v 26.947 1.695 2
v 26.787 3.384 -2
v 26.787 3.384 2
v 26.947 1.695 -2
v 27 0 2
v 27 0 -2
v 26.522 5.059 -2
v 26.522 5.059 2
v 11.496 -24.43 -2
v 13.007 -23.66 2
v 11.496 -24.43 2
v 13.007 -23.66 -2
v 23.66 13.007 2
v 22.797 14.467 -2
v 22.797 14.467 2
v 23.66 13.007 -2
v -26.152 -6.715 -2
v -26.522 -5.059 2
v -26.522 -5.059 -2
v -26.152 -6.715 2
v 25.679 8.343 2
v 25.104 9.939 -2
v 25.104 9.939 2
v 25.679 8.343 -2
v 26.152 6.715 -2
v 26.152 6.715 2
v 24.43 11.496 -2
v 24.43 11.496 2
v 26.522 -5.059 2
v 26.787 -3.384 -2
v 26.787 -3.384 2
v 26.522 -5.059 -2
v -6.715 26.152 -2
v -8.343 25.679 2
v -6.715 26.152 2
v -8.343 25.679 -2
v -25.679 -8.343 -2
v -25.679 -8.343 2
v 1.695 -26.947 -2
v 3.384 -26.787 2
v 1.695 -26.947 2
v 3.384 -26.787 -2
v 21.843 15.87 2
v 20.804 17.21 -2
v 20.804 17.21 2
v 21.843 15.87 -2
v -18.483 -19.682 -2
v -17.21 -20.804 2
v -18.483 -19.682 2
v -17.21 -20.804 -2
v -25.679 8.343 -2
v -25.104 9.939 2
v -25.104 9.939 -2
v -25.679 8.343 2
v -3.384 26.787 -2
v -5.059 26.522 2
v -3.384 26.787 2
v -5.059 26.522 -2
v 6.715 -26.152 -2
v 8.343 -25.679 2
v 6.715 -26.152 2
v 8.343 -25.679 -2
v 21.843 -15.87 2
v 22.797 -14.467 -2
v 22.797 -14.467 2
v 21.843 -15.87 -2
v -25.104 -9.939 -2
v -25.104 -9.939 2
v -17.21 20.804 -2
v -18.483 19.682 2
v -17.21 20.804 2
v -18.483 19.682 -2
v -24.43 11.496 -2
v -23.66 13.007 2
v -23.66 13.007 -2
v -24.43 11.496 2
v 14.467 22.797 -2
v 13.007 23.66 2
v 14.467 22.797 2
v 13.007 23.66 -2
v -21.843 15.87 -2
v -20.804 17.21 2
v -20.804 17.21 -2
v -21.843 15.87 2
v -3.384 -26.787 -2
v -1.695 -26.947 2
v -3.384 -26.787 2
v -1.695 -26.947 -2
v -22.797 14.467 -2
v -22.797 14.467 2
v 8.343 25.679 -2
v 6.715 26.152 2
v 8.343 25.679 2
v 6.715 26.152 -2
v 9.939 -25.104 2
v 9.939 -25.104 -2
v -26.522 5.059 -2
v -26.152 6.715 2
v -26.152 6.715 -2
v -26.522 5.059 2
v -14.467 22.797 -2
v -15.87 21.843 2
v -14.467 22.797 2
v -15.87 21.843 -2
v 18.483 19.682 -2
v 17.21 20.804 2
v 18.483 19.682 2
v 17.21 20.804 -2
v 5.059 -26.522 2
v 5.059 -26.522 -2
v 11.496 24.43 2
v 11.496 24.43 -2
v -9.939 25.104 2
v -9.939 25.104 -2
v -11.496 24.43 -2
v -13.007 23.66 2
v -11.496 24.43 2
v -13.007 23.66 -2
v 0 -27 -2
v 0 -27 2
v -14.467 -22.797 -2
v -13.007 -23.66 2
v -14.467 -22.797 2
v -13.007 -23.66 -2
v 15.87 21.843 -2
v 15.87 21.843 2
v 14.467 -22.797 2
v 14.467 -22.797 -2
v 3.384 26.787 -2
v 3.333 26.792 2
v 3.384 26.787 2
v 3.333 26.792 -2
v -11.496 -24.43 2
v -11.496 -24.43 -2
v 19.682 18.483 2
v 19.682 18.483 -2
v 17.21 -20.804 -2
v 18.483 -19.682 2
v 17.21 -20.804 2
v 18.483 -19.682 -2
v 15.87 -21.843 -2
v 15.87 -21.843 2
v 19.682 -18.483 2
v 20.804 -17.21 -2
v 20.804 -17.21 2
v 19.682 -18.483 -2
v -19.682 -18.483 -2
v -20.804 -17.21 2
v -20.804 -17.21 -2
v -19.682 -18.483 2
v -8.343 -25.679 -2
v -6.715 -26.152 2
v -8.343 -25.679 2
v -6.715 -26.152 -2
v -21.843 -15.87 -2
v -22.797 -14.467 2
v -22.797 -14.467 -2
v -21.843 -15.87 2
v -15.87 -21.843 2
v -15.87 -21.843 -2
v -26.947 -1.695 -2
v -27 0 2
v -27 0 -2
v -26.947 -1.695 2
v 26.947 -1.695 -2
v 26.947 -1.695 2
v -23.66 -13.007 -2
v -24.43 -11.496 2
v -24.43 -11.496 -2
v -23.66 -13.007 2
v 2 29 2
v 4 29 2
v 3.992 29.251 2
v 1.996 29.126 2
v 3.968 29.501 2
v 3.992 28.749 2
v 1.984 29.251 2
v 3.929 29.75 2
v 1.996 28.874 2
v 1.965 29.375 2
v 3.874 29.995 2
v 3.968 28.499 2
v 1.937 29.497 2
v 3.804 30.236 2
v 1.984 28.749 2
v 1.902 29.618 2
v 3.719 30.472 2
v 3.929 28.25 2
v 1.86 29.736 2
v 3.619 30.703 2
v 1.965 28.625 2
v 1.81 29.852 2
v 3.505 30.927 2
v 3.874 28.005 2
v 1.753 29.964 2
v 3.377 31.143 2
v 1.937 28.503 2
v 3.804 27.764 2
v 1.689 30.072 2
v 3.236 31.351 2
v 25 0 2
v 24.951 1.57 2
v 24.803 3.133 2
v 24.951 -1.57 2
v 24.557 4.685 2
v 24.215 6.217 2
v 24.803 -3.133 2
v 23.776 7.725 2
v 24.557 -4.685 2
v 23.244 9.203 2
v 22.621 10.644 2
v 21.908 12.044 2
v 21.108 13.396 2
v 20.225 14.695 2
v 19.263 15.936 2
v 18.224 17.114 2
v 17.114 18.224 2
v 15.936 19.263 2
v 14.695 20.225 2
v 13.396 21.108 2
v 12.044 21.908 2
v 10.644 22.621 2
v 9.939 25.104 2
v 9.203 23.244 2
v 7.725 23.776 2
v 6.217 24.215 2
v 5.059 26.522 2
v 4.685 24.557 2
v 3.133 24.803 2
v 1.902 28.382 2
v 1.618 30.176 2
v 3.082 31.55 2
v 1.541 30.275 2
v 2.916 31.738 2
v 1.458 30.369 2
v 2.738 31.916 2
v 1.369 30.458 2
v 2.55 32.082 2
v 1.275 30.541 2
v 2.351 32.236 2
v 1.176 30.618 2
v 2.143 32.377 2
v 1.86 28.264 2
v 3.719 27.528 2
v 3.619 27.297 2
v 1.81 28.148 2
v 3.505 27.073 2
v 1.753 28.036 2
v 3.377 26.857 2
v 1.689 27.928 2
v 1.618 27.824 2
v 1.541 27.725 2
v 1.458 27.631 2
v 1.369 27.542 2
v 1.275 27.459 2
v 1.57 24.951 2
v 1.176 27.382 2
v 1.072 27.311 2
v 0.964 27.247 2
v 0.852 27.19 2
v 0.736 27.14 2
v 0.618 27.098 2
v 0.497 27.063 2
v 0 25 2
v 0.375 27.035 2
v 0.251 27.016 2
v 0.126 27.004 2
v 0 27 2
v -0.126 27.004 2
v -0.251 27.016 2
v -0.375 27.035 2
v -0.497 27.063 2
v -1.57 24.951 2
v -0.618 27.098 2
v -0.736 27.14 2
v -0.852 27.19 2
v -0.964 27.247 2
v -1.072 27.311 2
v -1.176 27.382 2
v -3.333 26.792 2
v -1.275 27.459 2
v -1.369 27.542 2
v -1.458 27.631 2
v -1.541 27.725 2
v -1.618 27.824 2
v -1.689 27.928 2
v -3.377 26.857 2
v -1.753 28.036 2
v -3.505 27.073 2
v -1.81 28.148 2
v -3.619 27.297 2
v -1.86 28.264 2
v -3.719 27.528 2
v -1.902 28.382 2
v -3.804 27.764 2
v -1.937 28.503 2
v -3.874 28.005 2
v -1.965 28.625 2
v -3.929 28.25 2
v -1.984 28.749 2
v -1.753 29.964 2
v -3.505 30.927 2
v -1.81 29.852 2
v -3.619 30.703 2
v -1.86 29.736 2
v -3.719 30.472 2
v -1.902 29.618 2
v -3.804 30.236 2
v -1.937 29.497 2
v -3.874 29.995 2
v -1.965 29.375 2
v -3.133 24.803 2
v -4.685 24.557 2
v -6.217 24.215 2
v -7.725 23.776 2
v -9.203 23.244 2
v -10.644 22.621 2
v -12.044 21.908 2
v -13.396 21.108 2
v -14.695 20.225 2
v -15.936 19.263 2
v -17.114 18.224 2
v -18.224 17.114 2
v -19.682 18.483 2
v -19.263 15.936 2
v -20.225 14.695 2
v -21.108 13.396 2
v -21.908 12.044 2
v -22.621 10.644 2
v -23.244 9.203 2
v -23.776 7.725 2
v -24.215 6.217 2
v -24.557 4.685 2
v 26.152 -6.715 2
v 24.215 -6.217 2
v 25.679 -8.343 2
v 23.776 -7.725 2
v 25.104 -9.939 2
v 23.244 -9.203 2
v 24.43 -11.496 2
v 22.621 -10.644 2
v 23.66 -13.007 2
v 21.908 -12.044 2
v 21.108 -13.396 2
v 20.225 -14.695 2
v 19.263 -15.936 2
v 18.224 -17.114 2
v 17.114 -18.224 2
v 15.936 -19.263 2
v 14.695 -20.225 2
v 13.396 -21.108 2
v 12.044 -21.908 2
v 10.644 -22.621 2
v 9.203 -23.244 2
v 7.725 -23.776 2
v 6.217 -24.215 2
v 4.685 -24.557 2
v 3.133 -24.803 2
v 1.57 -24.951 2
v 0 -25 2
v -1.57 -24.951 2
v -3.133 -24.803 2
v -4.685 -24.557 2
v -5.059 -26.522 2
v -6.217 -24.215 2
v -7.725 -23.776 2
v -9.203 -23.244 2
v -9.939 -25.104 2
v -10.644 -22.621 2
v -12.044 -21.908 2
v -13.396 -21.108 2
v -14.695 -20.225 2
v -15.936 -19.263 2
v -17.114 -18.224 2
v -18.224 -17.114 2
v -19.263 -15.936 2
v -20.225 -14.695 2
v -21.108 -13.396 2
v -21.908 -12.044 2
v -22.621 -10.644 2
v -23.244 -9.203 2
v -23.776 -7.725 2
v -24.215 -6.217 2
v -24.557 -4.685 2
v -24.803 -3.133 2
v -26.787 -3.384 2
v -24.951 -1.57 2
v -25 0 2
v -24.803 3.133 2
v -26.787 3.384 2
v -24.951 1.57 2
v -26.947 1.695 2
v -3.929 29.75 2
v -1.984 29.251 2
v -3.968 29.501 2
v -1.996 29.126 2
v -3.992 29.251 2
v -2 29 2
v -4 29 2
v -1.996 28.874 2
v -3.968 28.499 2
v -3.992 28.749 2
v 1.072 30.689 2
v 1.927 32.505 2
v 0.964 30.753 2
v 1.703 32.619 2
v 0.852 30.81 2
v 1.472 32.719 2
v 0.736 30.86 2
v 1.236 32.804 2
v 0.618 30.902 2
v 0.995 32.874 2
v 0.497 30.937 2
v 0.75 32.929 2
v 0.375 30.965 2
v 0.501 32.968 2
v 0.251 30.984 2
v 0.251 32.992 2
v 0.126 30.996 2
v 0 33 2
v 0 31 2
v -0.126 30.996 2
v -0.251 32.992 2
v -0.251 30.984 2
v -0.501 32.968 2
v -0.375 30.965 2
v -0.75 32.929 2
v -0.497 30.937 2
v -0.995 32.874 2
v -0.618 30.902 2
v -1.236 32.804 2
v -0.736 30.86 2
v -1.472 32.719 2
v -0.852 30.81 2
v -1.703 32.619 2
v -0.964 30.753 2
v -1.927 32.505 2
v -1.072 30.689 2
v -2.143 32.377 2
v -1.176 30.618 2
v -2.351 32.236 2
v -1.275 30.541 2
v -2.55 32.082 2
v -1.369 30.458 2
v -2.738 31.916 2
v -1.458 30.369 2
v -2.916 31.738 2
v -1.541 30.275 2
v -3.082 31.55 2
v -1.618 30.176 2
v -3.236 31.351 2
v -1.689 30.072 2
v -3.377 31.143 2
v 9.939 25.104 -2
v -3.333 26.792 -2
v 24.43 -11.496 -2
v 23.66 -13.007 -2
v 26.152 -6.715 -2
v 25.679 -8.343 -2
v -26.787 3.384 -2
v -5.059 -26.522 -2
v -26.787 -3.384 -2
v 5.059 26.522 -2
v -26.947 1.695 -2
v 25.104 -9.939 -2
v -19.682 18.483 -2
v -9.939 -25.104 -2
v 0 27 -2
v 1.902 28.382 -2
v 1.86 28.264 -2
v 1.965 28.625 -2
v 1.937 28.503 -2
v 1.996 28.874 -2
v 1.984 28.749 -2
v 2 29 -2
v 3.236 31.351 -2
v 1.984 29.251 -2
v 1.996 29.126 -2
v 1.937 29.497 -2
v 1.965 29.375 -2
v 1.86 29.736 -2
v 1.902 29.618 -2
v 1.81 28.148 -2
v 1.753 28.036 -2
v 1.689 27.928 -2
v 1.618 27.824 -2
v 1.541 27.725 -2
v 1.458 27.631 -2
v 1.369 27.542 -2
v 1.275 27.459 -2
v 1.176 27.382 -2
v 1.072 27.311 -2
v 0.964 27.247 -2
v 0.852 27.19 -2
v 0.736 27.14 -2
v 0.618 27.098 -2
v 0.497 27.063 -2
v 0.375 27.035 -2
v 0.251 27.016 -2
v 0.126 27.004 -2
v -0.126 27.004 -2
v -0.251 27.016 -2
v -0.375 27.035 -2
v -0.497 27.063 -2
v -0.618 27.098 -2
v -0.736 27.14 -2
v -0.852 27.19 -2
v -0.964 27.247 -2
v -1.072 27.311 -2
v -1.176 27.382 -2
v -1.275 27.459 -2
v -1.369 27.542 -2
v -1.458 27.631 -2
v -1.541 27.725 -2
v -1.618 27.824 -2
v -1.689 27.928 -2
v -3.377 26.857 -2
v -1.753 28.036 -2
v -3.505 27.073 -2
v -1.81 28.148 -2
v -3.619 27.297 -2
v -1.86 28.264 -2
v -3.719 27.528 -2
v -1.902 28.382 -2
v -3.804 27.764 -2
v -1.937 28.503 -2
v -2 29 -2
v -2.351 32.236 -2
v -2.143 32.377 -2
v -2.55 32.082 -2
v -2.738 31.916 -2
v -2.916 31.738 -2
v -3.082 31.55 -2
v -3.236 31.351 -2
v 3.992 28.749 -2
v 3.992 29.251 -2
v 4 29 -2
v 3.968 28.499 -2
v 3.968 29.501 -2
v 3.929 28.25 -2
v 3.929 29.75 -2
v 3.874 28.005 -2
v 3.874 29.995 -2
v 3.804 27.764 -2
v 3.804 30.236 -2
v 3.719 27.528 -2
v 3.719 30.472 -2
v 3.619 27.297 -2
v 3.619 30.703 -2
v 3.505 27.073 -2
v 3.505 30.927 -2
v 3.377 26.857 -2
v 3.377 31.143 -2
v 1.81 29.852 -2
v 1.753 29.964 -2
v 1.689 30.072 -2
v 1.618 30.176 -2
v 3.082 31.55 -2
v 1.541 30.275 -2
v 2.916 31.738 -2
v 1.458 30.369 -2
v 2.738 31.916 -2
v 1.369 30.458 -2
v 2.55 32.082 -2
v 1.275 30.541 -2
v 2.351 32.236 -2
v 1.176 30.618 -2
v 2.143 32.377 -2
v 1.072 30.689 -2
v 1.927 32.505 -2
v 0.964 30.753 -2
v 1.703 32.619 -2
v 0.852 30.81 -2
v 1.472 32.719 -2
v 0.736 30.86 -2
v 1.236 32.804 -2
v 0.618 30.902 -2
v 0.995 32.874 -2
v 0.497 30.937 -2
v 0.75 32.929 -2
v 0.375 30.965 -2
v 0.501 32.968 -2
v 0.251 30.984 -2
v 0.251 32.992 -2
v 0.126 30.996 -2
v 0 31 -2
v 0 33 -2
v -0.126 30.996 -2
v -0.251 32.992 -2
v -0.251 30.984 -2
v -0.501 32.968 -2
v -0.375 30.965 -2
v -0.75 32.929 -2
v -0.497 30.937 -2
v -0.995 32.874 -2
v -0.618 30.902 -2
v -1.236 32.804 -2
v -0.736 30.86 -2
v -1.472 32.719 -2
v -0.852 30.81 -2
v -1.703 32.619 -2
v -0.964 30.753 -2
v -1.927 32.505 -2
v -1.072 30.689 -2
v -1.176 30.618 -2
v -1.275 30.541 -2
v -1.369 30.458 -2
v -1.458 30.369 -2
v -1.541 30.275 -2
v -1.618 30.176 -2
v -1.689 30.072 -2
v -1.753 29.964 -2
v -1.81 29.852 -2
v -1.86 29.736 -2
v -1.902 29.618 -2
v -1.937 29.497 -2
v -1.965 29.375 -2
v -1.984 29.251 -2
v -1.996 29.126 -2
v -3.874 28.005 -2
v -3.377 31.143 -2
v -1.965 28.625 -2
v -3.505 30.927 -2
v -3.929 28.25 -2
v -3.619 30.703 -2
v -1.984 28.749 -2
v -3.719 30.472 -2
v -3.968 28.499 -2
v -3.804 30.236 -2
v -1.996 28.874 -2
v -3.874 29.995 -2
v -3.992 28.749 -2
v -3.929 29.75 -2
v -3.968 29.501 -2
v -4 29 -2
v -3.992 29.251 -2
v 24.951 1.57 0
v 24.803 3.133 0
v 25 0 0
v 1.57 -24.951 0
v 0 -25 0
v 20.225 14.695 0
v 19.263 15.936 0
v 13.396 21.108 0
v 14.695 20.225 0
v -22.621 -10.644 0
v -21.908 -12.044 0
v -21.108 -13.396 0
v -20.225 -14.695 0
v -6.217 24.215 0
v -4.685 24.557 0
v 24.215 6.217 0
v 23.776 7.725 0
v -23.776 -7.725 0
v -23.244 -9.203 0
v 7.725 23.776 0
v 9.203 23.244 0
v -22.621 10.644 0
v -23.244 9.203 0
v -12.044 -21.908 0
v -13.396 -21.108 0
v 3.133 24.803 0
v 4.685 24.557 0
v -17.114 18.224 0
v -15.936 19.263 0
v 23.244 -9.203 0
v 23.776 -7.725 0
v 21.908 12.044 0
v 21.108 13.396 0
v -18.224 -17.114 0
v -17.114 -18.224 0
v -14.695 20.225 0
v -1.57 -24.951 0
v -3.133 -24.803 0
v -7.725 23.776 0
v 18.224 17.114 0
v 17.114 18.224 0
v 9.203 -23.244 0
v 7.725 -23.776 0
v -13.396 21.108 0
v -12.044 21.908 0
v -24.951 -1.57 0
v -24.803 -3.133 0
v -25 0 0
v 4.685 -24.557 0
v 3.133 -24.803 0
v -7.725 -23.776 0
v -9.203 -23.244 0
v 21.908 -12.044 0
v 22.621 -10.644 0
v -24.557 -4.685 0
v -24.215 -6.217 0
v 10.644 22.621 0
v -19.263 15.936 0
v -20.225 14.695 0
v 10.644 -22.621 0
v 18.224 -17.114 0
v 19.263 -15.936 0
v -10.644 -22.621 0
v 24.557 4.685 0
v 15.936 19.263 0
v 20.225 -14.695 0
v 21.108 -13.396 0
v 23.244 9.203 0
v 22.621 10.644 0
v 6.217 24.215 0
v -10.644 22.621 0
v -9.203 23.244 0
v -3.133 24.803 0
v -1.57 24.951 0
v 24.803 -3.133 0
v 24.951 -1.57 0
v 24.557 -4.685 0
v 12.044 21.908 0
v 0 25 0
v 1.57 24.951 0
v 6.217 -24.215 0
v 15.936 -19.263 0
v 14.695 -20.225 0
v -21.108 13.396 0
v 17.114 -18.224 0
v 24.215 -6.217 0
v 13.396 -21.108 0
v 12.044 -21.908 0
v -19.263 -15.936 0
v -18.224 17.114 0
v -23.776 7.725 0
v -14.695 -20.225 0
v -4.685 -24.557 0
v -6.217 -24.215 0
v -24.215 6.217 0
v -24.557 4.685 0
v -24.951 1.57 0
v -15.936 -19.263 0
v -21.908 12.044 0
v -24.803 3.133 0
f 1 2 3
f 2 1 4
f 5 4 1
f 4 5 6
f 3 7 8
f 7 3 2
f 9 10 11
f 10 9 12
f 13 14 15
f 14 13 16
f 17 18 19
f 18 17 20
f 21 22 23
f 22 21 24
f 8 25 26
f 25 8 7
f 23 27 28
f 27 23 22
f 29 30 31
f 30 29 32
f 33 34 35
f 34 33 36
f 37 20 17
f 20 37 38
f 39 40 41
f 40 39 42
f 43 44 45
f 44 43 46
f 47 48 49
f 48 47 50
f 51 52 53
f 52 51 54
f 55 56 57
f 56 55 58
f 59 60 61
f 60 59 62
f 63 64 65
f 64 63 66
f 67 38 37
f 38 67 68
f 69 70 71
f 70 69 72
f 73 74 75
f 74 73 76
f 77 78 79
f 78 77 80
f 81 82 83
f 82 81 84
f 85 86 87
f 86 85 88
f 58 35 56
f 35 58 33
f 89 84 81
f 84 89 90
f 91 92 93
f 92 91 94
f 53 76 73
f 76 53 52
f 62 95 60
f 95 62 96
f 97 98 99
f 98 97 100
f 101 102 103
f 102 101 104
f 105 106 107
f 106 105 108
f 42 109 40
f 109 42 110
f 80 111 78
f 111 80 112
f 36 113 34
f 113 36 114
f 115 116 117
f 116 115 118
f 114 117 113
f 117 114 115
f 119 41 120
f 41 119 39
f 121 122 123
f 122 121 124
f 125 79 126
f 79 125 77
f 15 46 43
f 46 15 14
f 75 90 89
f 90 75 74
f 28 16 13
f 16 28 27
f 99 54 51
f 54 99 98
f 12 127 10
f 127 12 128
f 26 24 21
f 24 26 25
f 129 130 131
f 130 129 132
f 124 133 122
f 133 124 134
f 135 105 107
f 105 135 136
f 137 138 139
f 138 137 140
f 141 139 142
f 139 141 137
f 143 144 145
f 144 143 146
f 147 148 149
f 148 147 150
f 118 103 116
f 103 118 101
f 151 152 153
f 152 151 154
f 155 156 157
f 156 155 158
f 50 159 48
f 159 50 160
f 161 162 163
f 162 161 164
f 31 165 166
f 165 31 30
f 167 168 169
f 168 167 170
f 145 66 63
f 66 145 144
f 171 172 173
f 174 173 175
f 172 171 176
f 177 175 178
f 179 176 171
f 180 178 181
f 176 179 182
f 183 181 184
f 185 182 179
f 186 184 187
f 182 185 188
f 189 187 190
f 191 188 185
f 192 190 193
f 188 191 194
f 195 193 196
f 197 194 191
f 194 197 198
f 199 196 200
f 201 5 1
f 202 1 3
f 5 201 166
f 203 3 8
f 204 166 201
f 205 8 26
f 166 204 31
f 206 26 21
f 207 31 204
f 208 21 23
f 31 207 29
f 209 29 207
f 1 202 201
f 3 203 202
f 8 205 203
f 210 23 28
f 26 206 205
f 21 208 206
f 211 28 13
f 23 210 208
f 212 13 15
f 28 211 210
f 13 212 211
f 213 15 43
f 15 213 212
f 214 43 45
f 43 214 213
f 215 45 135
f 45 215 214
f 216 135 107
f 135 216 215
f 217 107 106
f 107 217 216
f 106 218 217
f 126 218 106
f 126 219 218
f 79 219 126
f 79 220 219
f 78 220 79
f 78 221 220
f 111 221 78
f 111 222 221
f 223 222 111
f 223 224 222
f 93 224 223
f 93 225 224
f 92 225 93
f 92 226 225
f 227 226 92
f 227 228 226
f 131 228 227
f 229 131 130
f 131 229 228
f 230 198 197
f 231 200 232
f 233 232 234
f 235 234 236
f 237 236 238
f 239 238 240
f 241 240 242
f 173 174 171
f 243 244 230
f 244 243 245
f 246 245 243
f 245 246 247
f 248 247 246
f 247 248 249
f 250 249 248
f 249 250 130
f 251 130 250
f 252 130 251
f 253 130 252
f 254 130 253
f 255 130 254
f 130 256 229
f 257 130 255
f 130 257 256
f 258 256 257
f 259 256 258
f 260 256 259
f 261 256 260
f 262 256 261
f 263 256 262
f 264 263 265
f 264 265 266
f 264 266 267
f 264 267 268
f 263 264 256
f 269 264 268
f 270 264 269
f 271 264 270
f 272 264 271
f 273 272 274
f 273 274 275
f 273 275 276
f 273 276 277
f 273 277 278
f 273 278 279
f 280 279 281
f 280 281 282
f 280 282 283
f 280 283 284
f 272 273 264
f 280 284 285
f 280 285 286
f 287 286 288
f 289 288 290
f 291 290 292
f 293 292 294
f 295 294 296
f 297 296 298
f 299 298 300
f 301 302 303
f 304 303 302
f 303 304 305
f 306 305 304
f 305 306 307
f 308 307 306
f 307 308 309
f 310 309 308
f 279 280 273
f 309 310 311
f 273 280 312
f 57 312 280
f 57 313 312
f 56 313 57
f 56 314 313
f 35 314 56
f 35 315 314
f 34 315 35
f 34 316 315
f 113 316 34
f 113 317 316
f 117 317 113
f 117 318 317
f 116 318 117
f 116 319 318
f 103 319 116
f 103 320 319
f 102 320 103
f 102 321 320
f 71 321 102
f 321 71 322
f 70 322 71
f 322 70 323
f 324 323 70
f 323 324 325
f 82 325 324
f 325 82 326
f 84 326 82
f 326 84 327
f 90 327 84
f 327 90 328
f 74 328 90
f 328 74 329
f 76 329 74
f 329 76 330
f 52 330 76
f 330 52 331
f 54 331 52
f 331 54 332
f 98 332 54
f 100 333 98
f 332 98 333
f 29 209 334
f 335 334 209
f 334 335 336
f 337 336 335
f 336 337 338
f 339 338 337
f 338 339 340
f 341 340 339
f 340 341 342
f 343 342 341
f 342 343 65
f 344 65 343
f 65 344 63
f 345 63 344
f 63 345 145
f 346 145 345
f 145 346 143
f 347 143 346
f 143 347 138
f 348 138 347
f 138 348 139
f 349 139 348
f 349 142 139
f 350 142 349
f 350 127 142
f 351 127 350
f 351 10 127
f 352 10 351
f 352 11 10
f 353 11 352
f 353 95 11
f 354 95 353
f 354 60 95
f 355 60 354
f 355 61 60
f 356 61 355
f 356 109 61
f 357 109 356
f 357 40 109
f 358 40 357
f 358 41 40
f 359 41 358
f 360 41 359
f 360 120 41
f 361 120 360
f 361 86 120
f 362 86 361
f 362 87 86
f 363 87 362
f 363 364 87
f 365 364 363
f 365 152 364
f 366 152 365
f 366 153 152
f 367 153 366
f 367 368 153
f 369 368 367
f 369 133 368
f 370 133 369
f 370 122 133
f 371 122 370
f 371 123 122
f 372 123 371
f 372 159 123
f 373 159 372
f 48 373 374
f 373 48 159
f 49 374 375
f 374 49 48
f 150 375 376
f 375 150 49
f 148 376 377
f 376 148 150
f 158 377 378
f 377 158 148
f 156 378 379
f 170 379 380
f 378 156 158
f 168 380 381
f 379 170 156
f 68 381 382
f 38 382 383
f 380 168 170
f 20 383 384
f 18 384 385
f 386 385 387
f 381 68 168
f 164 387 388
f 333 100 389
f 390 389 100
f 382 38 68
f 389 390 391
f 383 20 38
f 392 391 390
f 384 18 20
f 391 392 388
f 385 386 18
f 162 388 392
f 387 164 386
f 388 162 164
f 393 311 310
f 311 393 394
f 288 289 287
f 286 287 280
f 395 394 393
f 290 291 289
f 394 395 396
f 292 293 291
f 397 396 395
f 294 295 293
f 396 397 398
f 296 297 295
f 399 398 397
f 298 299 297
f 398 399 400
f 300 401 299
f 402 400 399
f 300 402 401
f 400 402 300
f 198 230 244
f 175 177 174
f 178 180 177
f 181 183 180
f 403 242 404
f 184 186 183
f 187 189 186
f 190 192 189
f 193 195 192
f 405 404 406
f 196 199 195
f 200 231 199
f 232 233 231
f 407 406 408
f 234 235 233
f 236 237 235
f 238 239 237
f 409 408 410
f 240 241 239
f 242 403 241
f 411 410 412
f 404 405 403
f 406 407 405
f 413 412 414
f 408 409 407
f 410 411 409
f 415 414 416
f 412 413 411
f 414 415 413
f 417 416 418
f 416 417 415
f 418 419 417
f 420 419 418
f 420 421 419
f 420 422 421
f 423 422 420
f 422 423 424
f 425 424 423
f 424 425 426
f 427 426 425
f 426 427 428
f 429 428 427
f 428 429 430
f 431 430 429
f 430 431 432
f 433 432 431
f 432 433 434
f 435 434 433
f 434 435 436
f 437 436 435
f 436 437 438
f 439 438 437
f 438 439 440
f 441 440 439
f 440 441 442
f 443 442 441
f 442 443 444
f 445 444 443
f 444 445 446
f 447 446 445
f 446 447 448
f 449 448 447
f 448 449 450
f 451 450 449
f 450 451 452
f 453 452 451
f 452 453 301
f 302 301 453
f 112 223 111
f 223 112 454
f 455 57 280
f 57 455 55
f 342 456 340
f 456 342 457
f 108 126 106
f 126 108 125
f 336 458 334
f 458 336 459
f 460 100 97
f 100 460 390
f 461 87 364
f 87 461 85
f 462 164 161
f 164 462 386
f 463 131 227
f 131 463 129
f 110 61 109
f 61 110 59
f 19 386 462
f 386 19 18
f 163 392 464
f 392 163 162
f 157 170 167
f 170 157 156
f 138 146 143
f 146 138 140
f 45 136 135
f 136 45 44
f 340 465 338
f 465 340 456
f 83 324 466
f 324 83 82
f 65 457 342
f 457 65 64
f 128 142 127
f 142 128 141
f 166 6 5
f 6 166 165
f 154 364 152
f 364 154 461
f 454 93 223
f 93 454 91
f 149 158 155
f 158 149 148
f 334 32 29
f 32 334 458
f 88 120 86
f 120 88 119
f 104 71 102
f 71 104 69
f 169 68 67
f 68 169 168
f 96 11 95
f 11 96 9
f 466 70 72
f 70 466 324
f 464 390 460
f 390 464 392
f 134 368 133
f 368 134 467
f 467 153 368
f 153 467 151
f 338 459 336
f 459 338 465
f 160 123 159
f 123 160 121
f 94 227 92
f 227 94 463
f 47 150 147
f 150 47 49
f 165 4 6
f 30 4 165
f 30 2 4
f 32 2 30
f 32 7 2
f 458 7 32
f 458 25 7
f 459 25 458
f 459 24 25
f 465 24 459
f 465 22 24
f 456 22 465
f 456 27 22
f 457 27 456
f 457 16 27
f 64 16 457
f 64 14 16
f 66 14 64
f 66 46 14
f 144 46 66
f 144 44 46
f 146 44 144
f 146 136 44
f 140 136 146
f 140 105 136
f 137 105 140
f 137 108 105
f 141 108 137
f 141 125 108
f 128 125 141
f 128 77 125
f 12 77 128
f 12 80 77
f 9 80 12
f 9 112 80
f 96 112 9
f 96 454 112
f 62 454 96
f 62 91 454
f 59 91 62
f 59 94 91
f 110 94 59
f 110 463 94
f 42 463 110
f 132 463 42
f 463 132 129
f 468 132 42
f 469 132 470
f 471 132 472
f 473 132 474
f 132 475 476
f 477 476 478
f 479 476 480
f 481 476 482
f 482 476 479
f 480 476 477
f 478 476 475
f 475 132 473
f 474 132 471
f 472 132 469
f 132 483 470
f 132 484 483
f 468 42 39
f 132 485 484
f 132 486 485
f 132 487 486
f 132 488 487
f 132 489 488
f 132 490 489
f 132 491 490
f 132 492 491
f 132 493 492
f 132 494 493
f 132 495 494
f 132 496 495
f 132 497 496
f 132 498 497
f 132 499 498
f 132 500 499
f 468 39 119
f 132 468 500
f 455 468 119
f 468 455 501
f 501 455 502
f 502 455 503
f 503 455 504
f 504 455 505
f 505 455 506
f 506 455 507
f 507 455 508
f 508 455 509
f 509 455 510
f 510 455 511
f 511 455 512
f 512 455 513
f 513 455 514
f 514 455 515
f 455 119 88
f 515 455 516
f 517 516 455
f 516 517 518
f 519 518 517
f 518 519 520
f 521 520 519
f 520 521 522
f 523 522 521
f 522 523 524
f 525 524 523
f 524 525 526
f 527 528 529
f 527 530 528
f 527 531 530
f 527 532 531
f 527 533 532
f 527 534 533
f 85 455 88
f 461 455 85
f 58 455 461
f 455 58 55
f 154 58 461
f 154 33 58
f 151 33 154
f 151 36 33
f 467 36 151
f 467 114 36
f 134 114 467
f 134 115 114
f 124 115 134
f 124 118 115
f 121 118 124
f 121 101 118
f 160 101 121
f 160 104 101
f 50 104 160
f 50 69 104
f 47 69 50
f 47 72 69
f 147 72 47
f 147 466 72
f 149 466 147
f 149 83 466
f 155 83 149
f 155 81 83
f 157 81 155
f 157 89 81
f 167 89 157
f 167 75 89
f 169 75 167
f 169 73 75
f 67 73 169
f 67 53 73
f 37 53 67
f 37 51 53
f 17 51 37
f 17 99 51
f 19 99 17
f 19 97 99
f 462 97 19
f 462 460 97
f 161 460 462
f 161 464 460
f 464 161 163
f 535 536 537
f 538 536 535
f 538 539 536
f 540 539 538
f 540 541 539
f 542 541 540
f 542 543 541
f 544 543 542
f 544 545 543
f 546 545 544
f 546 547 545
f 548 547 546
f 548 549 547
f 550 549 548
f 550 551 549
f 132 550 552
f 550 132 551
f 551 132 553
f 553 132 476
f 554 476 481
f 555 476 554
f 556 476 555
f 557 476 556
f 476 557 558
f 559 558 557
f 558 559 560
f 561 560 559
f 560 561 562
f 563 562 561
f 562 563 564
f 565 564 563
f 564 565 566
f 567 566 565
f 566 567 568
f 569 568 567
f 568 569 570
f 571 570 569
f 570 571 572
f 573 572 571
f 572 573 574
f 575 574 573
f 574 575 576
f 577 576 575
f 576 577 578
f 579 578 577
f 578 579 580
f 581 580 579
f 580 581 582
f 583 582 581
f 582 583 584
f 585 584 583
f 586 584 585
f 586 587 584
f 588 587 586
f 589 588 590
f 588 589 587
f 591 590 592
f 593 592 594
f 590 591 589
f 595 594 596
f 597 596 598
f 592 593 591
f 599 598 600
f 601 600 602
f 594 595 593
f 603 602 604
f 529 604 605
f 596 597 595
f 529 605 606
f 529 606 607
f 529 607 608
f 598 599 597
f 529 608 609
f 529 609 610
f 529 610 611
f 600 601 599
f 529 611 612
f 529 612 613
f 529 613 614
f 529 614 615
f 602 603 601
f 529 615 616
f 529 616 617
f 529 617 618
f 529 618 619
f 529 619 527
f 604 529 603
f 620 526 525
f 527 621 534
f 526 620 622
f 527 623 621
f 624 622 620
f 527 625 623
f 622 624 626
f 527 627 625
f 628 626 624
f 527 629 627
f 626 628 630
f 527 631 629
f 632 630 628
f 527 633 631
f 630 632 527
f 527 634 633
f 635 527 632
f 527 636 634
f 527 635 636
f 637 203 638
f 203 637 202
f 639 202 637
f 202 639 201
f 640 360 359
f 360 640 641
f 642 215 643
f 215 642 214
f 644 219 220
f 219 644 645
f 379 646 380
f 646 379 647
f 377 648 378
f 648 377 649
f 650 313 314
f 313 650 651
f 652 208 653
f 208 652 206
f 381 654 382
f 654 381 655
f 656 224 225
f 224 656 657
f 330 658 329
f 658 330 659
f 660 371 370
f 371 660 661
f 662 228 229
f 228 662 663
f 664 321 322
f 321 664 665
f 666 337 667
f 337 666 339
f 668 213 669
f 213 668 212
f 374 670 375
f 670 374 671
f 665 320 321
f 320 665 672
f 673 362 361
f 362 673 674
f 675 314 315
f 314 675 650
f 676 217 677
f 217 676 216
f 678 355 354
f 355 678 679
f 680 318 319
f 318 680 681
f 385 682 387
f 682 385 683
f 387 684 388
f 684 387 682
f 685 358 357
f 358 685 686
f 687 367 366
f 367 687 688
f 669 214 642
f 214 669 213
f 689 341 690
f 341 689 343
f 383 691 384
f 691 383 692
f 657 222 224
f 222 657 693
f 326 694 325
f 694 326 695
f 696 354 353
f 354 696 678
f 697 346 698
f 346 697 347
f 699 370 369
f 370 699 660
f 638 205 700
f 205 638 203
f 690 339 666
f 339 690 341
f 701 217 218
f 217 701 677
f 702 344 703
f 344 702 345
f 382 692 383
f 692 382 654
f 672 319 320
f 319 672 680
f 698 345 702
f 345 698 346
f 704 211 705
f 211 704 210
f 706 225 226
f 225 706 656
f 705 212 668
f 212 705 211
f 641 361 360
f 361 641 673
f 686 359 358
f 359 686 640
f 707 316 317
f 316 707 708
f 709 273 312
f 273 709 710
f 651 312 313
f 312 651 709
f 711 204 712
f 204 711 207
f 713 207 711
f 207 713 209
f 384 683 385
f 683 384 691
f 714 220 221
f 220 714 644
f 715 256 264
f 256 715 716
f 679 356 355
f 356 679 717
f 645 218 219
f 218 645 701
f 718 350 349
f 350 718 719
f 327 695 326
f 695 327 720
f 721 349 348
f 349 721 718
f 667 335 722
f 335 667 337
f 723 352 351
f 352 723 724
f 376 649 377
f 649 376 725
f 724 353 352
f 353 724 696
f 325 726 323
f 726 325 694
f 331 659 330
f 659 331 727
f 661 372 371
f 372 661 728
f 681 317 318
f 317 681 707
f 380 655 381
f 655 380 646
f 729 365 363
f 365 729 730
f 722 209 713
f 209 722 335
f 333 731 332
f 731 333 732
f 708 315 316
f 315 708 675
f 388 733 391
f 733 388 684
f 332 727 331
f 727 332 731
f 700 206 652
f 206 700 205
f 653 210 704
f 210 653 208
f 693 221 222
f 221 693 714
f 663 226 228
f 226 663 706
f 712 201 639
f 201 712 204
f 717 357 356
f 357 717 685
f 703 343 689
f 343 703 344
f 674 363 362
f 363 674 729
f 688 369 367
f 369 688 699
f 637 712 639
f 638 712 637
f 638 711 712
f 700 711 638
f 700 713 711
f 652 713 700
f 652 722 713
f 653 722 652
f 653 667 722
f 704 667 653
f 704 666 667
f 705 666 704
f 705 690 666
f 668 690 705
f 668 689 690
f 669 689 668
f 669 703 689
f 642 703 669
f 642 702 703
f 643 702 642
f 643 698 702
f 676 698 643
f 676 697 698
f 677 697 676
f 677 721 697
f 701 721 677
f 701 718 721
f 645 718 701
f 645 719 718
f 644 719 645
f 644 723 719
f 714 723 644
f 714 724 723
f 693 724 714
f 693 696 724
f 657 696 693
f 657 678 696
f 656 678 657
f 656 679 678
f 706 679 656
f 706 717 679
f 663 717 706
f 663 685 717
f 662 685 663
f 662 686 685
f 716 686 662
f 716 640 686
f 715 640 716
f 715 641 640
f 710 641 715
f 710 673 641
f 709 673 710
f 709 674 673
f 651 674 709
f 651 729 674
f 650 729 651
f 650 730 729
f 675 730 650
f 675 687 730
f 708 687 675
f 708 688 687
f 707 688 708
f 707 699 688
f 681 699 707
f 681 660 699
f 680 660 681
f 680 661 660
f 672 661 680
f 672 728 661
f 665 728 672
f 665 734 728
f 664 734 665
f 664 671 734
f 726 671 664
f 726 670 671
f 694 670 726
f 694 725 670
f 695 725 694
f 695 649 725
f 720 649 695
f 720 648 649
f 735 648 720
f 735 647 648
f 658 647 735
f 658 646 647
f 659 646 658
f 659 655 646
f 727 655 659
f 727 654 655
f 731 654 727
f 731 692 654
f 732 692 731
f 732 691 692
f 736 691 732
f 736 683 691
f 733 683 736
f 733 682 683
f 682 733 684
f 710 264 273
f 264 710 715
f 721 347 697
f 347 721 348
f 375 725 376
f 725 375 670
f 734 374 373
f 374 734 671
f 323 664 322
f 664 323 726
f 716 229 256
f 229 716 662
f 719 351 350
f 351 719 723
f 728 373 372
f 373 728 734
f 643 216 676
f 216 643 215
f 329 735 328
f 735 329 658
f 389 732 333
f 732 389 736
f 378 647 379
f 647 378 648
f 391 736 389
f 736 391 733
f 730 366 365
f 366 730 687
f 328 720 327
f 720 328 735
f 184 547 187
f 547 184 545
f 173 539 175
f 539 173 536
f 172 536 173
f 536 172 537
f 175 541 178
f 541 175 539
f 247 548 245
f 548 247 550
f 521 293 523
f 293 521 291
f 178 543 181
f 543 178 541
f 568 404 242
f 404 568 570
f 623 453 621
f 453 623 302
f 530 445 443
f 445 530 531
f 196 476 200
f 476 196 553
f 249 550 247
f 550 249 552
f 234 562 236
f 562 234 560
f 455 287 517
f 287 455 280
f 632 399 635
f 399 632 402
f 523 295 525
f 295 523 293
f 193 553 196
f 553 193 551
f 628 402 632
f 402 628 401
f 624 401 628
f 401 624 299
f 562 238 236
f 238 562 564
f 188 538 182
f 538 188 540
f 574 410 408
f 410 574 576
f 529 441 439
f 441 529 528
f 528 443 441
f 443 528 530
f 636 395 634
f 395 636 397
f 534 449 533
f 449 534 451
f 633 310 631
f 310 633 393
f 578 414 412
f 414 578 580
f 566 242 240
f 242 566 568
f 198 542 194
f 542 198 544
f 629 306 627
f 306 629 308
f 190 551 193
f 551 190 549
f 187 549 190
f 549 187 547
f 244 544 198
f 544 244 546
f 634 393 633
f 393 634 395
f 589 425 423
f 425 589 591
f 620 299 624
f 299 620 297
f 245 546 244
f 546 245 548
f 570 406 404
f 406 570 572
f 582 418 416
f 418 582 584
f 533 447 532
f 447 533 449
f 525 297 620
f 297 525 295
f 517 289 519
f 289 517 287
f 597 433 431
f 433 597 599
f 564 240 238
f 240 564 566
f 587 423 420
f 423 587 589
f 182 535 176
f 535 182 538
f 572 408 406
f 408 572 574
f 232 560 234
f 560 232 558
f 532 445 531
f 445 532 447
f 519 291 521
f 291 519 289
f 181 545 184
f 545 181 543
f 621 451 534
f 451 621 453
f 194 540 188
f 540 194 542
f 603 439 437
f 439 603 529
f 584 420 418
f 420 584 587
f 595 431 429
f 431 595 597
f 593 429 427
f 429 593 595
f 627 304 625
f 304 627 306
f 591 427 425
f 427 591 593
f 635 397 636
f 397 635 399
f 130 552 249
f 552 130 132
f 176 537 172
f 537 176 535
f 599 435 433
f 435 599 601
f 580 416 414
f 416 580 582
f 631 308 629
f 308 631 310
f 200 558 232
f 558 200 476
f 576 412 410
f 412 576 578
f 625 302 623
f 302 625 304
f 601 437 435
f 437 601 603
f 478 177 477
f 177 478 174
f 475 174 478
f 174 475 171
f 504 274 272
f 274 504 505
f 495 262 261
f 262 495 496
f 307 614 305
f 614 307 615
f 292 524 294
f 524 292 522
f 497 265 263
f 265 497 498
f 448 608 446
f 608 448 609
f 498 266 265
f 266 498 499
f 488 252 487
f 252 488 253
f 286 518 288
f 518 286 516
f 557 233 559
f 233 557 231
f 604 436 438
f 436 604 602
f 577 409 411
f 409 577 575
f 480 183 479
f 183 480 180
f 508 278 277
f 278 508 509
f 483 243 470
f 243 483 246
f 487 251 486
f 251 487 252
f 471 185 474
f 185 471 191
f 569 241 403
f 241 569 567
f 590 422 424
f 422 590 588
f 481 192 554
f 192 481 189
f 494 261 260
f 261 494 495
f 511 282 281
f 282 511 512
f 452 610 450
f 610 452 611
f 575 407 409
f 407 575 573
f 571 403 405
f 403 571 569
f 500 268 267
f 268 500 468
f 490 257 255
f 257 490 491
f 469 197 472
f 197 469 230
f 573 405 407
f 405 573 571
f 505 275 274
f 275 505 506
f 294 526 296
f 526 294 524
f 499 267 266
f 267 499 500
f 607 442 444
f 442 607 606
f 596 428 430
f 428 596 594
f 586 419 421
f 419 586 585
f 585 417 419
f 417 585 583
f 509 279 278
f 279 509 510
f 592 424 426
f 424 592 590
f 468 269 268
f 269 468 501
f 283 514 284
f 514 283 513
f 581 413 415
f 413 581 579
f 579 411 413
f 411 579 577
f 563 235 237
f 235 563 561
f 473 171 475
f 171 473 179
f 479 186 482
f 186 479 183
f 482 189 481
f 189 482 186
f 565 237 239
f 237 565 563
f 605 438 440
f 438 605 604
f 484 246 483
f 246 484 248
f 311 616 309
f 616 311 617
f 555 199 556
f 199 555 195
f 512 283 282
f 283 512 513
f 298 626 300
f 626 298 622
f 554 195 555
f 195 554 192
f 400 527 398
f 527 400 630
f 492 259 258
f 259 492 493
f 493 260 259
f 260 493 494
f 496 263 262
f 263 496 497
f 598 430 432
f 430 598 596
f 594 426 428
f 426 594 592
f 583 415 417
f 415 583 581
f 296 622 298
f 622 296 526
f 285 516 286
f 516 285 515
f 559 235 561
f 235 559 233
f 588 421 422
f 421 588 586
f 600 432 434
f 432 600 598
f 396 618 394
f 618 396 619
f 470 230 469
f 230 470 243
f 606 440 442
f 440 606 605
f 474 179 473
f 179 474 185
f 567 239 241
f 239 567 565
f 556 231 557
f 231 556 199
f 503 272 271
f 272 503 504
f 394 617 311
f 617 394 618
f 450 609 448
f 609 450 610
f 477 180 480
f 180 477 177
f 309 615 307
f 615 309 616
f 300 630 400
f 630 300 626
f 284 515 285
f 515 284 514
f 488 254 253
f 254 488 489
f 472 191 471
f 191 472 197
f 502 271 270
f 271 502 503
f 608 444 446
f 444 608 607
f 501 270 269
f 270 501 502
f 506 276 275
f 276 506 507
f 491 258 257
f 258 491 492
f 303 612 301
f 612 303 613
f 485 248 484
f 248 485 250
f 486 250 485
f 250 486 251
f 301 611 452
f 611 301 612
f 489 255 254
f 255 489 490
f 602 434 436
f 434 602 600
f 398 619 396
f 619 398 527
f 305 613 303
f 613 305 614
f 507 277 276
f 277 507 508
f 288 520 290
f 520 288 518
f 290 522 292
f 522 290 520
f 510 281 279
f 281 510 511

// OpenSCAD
$fn = 100;

difference() {
    translate([0, 0, 1]) {
        resize([50, 50, 2]) {
            surface(file = "10po_bw_blur.png", center = true, invert = true, convexity = 5);
        }
    }
    difference() {
        cube([60, 60, 20], center = true);
        cylinder(r = 25, h = 21, center = true);
    }
}

difference() {
    translate([0, 0, - 2]) cylinder(r = 27, h = 4);
    cylinder(r = 25, h = 4);
}

translate([0, 29, - 2]) {
    difference() {
        cylinder(r = 4, h = 4);
        cylinder(r = 2, h = 5);
    }
}
